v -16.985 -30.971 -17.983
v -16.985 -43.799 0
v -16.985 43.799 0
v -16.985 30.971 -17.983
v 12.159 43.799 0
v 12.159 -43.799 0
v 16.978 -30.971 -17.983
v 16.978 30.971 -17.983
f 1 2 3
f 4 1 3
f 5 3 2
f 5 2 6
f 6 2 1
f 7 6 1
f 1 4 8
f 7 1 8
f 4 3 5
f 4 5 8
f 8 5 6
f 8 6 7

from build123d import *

# Parameters (mm, degrees)
F0_W        = 33.9705549621
F0_H        = 87.9016891122
F1_DEPTH    = 17.9832
F2_T1_DEPTH = 127.9393629633
F3_T1_DEPTH = 181.1359395425


# Not quite as in the source:
# - a fillet or chamfer that OpenCascade refuses, or shapes differently, is made with other operations: its cross-section is extruded or revolved along the edge and cut away or added


with BuildPart() as f1:
    # F0 (on Top) → F1 (new body)
    with BuildSketch(Plane.XY):
        Rectangle(F0_W, F0_H)
    extrude(amount=-F1_DEPTH)

    # F2: chamfer of 12.9794 x 18.1964476933 on 2 edges, made by hand

    # F2_s2 → F2_t1 (cut)
    with BuildSketch(Plane.YZ.offset(-63.9696814817)):
        Polygon((-43.9508445561, 0.2132476933), (-30.9714445561, -17.9832), (-43.9508445561, -17.9832), align=None)
        Polygon((43.9508445561, 0.2132476933), (30.9714445561, -17.9832), (43.9508445561, -17.9832), align=None)
    extrude(amount=F2_T1_DEPTH, mode=Mode.SUBTRACT)

    # F3: chamfer of 4.826 x 18.0108771973 on 1 edges, made by hand

    # F3_s2 → F3_t1 (cut)
    with BuildSketch(Plane.XZ.offset(-90.5679697713)):
        Polygon((12.1592774811, 0), (16.9852774811, -18.0108771973), (16.9852774811, 0), align=None)
    extrude(amount=F3_T1_DEPTH, mode=Mode.SUBTRACT)


solid = f1.part
